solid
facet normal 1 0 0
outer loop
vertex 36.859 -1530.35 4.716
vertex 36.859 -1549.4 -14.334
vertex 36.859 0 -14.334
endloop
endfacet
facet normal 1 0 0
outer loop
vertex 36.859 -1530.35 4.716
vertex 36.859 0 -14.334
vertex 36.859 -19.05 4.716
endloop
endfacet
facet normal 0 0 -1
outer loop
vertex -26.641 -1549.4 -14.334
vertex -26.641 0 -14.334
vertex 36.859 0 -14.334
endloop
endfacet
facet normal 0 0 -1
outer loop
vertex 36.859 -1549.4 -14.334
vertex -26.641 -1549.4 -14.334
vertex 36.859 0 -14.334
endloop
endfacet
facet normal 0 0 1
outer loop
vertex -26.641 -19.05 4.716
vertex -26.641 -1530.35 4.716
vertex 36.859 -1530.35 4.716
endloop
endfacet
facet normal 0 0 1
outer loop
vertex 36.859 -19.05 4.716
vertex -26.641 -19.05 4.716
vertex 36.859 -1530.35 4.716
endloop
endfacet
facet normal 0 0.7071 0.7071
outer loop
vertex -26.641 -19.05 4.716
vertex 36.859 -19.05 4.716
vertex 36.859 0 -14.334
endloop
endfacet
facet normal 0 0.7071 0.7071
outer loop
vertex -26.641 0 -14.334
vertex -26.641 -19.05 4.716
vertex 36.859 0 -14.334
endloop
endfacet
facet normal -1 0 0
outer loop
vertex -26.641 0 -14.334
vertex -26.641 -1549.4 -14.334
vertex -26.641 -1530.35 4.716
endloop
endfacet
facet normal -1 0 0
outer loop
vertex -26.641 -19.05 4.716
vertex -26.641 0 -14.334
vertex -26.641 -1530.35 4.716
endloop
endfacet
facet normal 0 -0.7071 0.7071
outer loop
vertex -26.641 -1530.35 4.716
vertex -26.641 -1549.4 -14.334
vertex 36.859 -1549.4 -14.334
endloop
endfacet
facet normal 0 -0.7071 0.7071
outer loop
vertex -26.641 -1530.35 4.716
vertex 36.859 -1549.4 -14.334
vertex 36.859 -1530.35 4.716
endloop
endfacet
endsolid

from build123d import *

# Parameters (mm, degrees)
F0_W     = 63.5
F0_H     = 38.1
F1_DEPTH = 1549.4
F3_DEPTH = 76.2
F4_W     = 63.5
F4_H     = 19.05
F5_DEPTH = 1549.401


with BuildPart() as f1:
    # F0 (on Front) → F1 (new body)
    with BuildSketch(Plane.XZ):
        with Locations((5.109261, 4.715717)):
            Rectangle(F0_W, F0_H)
    extrude(amount=F1_DEPTH)

    # F2 (on face) → F3 (cut)
    with BuildSketch(Plane.YZ.offset(36.859261)):
        Polygon((-1549.4, 23.765717), (-1549.4, -14.334283), (-1511.3, 23.765717), align=None)
        Polygon((-38.1, 23.765717), (0, -14.334283), (0, 23.765717), align=None)
    extrude(amount=-F3_DEPTH, mode=Mode.SUBTRACT)

    # F4 (on Front) → F5 (cut, through all)
    with BuildSketch(Plane.XZ):
        with Locations((5.109261, 14.240717)):
            Rectangle(F4_W, F4_H)
    extrude(amount=F5_DEPTH, mode=Mode.SUBTRACT)


solid = f1.part
